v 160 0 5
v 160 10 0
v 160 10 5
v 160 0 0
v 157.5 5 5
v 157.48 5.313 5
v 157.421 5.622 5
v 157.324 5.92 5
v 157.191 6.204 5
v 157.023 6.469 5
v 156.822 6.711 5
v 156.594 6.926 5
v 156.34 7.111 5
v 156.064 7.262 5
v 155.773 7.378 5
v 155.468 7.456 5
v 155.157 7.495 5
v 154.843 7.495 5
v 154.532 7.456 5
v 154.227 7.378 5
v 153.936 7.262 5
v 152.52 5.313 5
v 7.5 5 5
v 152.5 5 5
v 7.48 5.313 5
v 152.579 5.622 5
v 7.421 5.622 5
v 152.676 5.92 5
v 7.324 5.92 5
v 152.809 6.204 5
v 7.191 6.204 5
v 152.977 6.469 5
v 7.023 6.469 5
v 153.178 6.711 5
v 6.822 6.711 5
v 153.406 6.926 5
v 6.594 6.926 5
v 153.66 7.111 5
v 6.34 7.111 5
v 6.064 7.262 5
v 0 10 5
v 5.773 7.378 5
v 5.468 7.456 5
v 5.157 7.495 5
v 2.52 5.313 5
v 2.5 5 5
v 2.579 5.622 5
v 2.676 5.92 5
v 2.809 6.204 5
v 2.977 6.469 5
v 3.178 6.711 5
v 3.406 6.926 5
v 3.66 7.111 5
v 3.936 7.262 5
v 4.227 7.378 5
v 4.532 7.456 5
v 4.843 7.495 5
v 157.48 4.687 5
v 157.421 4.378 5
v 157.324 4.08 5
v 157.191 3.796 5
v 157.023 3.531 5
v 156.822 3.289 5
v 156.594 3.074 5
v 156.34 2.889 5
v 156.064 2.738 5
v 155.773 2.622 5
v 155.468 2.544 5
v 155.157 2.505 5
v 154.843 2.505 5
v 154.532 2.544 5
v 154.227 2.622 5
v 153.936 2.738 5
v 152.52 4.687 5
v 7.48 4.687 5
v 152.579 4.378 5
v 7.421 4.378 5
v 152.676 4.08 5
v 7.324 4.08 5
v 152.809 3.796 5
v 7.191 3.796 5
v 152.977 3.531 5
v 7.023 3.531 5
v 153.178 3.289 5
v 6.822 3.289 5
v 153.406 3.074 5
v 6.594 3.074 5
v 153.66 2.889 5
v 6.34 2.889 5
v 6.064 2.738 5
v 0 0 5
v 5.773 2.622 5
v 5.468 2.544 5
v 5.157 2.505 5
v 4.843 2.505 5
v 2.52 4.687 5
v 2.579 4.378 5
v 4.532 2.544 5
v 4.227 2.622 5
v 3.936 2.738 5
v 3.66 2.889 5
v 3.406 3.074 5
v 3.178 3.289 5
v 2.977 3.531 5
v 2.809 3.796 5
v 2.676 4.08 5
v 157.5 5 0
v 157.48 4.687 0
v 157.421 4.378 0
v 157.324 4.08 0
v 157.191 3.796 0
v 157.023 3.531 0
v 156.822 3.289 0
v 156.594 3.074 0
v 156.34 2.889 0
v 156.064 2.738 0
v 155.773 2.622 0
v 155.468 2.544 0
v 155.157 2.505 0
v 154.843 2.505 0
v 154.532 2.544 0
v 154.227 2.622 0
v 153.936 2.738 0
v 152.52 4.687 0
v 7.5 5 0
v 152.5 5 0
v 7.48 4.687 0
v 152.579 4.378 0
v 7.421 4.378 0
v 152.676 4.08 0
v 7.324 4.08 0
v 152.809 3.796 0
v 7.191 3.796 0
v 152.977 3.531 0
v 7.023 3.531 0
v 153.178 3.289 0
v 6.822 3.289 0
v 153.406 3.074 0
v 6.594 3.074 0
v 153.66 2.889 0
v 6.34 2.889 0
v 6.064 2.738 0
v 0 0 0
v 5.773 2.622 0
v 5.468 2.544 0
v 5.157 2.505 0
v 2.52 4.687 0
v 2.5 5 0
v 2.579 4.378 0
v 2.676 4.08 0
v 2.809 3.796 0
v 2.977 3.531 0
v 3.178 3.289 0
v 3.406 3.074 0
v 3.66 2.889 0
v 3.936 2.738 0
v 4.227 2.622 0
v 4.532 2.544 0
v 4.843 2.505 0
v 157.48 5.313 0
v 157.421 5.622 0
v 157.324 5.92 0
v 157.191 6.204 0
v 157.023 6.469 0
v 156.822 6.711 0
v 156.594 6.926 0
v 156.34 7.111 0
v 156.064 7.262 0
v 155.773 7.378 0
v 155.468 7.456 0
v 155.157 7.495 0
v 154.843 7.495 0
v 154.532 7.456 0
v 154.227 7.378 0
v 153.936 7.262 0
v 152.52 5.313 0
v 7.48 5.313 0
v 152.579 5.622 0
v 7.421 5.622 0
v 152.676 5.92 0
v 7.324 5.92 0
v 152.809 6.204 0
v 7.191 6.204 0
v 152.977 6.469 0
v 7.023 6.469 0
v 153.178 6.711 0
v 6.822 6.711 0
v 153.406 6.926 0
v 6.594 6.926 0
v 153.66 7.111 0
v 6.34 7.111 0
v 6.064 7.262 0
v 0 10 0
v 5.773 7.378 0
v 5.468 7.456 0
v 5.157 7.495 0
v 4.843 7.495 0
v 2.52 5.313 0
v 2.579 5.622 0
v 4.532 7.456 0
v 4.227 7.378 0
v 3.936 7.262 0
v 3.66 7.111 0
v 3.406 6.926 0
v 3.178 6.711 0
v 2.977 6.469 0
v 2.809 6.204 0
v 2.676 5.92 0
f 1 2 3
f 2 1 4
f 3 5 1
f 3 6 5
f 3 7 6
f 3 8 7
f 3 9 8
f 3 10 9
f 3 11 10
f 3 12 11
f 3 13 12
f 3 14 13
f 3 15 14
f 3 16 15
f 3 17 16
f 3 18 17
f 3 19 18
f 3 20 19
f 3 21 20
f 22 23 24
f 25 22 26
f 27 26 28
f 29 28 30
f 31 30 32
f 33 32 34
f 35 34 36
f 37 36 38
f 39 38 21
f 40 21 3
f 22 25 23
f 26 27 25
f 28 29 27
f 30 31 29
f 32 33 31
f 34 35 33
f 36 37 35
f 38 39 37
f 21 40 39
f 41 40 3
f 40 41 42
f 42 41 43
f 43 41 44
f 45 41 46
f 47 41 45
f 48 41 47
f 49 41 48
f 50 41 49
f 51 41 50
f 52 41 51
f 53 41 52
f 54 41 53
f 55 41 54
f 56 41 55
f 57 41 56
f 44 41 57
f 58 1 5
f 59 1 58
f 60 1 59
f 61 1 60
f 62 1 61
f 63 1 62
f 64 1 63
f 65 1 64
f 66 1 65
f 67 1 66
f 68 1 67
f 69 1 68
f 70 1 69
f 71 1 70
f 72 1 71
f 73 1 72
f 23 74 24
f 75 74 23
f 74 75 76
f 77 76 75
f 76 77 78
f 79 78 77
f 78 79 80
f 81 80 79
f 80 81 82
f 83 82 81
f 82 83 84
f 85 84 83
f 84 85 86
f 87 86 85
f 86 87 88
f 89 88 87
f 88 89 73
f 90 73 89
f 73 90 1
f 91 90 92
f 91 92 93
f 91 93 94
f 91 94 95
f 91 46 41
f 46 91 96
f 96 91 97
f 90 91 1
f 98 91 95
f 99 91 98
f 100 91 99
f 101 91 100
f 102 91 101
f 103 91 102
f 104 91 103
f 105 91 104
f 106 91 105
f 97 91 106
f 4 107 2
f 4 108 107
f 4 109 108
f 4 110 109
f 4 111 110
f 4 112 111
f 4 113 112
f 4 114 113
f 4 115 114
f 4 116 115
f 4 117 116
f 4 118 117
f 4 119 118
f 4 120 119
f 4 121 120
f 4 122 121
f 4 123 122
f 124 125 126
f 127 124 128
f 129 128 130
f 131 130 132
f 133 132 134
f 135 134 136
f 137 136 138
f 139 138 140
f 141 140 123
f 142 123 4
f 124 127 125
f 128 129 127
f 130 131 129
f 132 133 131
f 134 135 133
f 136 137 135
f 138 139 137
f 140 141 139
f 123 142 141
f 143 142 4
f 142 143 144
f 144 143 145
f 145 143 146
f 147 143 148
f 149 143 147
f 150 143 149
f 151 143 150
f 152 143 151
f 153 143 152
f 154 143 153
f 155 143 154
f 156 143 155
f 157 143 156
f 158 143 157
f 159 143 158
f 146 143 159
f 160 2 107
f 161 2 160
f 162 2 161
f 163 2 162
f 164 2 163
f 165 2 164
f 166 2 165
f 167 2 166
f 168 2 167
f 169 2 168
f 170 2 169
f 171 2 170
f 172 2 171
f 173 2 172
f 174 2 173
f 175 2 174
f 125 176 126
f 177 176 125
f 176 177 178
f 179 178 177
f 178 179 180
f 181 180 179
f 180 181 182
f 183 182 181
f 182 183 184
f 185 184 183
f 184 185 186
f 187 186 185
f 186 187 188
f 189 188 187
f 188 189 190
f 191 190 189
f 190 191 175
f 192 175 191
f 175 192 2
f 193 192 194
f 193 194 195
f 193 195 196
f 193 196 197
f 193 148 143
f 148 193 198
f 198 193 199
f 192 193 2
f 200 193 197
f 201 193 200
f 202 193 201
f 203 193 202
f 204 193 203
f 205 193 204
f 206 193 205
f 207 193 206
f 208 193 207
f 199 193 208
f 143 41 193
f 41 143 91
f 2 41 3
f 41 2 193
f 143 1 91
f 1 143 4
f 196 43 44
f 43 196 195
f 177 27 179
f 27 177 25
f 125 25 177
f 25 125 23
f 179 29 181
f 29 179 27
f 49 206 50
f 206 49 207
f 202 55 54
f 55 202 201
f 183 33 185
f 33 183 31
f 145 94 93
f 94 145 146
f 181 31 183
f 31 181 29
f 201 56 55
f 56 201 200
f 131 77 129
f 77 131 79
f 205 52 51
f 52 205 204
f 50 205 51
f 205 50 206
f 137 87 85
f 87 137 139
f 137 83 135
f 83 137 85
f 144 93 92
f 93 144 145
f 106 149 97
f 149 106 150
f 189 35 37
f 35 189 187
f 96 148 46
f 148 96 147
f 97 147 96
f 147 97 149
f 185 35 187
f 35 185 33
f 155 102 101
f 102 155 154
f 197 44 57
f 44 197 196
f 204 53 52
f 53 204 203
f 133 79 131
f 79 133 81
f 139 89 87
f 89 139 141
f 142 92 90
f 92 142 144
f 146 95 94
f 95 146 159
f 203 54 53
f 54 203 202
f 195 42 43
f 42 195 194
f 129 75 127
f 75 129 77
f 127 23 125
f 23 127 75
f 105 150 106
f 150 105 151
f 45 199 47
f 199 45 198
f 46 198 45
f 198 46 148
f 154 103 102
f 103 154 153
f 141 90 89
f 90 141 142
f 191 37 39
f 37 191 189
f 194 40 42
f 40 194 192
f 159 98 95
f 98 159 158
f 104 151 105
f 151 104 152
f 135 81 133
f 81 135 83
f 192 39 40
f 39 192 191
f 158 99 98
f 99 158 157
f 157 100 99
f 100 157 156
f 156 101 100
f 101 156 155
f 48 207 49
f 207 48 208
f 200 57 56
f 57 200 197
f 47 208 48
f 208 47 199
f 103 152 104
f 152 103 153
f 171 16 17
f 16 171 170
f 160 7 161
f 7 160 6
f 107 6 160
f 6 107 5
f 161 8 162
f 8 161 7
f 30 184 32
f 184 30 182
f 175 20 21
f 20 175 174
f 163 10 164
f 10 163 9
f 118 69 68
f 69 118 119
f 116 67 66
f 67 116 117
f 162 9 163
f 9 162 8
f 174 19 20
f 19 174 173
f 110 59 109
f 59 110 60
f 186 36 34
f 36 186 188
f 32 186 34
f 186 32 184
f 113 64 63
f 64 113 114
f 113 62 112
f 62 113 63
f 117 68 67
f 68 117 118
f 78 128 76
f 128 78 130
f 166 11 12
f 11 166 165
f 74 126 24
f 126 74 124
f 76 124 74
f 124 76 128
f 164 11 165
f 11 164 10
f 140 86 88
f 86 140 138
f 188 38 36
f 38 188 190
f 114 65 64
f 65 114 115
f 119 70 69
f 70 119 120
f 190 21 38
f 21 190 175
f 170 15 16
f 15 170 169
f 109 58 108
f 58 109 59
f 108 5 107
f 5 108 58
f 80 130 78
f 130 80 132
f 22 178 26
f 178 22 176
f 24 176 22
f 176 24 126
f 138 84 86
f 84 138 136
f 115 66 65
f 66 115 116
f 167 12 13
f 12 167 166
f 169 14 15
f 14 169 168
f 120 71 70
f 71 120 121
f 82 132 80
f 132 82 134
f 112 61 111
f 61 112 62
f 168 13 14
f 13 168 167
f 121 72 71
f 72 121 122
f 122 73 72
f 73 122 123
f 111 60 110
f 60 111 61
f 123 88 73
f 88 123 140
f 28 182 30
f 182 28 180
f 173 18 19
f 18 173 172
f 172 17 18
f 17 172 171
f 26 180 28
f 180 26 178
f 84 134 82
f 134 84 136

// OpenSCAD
$fn = 50;

// system of coordinates: x is the long coordinate
hole_length = 150;
length = 160;
part_x = length;
width = 10;
part_y = width;
thickness = 5;
part_z = thickness;

cut_margin = 5;

hole_d = 5;
module hole() {
       cylinder(d=5, h=50);       
}

module vert_control_ligament() {
       difference() {
        color([0,0,0.7]) cube([part_x, part_y, part_z]);
        translate([5,part_y/2,-cut_margin]) hole();
        translate([5 + hole_length ,part_y/2,-cut_margin]) hole();
       }
}

vert_control_ligament();
